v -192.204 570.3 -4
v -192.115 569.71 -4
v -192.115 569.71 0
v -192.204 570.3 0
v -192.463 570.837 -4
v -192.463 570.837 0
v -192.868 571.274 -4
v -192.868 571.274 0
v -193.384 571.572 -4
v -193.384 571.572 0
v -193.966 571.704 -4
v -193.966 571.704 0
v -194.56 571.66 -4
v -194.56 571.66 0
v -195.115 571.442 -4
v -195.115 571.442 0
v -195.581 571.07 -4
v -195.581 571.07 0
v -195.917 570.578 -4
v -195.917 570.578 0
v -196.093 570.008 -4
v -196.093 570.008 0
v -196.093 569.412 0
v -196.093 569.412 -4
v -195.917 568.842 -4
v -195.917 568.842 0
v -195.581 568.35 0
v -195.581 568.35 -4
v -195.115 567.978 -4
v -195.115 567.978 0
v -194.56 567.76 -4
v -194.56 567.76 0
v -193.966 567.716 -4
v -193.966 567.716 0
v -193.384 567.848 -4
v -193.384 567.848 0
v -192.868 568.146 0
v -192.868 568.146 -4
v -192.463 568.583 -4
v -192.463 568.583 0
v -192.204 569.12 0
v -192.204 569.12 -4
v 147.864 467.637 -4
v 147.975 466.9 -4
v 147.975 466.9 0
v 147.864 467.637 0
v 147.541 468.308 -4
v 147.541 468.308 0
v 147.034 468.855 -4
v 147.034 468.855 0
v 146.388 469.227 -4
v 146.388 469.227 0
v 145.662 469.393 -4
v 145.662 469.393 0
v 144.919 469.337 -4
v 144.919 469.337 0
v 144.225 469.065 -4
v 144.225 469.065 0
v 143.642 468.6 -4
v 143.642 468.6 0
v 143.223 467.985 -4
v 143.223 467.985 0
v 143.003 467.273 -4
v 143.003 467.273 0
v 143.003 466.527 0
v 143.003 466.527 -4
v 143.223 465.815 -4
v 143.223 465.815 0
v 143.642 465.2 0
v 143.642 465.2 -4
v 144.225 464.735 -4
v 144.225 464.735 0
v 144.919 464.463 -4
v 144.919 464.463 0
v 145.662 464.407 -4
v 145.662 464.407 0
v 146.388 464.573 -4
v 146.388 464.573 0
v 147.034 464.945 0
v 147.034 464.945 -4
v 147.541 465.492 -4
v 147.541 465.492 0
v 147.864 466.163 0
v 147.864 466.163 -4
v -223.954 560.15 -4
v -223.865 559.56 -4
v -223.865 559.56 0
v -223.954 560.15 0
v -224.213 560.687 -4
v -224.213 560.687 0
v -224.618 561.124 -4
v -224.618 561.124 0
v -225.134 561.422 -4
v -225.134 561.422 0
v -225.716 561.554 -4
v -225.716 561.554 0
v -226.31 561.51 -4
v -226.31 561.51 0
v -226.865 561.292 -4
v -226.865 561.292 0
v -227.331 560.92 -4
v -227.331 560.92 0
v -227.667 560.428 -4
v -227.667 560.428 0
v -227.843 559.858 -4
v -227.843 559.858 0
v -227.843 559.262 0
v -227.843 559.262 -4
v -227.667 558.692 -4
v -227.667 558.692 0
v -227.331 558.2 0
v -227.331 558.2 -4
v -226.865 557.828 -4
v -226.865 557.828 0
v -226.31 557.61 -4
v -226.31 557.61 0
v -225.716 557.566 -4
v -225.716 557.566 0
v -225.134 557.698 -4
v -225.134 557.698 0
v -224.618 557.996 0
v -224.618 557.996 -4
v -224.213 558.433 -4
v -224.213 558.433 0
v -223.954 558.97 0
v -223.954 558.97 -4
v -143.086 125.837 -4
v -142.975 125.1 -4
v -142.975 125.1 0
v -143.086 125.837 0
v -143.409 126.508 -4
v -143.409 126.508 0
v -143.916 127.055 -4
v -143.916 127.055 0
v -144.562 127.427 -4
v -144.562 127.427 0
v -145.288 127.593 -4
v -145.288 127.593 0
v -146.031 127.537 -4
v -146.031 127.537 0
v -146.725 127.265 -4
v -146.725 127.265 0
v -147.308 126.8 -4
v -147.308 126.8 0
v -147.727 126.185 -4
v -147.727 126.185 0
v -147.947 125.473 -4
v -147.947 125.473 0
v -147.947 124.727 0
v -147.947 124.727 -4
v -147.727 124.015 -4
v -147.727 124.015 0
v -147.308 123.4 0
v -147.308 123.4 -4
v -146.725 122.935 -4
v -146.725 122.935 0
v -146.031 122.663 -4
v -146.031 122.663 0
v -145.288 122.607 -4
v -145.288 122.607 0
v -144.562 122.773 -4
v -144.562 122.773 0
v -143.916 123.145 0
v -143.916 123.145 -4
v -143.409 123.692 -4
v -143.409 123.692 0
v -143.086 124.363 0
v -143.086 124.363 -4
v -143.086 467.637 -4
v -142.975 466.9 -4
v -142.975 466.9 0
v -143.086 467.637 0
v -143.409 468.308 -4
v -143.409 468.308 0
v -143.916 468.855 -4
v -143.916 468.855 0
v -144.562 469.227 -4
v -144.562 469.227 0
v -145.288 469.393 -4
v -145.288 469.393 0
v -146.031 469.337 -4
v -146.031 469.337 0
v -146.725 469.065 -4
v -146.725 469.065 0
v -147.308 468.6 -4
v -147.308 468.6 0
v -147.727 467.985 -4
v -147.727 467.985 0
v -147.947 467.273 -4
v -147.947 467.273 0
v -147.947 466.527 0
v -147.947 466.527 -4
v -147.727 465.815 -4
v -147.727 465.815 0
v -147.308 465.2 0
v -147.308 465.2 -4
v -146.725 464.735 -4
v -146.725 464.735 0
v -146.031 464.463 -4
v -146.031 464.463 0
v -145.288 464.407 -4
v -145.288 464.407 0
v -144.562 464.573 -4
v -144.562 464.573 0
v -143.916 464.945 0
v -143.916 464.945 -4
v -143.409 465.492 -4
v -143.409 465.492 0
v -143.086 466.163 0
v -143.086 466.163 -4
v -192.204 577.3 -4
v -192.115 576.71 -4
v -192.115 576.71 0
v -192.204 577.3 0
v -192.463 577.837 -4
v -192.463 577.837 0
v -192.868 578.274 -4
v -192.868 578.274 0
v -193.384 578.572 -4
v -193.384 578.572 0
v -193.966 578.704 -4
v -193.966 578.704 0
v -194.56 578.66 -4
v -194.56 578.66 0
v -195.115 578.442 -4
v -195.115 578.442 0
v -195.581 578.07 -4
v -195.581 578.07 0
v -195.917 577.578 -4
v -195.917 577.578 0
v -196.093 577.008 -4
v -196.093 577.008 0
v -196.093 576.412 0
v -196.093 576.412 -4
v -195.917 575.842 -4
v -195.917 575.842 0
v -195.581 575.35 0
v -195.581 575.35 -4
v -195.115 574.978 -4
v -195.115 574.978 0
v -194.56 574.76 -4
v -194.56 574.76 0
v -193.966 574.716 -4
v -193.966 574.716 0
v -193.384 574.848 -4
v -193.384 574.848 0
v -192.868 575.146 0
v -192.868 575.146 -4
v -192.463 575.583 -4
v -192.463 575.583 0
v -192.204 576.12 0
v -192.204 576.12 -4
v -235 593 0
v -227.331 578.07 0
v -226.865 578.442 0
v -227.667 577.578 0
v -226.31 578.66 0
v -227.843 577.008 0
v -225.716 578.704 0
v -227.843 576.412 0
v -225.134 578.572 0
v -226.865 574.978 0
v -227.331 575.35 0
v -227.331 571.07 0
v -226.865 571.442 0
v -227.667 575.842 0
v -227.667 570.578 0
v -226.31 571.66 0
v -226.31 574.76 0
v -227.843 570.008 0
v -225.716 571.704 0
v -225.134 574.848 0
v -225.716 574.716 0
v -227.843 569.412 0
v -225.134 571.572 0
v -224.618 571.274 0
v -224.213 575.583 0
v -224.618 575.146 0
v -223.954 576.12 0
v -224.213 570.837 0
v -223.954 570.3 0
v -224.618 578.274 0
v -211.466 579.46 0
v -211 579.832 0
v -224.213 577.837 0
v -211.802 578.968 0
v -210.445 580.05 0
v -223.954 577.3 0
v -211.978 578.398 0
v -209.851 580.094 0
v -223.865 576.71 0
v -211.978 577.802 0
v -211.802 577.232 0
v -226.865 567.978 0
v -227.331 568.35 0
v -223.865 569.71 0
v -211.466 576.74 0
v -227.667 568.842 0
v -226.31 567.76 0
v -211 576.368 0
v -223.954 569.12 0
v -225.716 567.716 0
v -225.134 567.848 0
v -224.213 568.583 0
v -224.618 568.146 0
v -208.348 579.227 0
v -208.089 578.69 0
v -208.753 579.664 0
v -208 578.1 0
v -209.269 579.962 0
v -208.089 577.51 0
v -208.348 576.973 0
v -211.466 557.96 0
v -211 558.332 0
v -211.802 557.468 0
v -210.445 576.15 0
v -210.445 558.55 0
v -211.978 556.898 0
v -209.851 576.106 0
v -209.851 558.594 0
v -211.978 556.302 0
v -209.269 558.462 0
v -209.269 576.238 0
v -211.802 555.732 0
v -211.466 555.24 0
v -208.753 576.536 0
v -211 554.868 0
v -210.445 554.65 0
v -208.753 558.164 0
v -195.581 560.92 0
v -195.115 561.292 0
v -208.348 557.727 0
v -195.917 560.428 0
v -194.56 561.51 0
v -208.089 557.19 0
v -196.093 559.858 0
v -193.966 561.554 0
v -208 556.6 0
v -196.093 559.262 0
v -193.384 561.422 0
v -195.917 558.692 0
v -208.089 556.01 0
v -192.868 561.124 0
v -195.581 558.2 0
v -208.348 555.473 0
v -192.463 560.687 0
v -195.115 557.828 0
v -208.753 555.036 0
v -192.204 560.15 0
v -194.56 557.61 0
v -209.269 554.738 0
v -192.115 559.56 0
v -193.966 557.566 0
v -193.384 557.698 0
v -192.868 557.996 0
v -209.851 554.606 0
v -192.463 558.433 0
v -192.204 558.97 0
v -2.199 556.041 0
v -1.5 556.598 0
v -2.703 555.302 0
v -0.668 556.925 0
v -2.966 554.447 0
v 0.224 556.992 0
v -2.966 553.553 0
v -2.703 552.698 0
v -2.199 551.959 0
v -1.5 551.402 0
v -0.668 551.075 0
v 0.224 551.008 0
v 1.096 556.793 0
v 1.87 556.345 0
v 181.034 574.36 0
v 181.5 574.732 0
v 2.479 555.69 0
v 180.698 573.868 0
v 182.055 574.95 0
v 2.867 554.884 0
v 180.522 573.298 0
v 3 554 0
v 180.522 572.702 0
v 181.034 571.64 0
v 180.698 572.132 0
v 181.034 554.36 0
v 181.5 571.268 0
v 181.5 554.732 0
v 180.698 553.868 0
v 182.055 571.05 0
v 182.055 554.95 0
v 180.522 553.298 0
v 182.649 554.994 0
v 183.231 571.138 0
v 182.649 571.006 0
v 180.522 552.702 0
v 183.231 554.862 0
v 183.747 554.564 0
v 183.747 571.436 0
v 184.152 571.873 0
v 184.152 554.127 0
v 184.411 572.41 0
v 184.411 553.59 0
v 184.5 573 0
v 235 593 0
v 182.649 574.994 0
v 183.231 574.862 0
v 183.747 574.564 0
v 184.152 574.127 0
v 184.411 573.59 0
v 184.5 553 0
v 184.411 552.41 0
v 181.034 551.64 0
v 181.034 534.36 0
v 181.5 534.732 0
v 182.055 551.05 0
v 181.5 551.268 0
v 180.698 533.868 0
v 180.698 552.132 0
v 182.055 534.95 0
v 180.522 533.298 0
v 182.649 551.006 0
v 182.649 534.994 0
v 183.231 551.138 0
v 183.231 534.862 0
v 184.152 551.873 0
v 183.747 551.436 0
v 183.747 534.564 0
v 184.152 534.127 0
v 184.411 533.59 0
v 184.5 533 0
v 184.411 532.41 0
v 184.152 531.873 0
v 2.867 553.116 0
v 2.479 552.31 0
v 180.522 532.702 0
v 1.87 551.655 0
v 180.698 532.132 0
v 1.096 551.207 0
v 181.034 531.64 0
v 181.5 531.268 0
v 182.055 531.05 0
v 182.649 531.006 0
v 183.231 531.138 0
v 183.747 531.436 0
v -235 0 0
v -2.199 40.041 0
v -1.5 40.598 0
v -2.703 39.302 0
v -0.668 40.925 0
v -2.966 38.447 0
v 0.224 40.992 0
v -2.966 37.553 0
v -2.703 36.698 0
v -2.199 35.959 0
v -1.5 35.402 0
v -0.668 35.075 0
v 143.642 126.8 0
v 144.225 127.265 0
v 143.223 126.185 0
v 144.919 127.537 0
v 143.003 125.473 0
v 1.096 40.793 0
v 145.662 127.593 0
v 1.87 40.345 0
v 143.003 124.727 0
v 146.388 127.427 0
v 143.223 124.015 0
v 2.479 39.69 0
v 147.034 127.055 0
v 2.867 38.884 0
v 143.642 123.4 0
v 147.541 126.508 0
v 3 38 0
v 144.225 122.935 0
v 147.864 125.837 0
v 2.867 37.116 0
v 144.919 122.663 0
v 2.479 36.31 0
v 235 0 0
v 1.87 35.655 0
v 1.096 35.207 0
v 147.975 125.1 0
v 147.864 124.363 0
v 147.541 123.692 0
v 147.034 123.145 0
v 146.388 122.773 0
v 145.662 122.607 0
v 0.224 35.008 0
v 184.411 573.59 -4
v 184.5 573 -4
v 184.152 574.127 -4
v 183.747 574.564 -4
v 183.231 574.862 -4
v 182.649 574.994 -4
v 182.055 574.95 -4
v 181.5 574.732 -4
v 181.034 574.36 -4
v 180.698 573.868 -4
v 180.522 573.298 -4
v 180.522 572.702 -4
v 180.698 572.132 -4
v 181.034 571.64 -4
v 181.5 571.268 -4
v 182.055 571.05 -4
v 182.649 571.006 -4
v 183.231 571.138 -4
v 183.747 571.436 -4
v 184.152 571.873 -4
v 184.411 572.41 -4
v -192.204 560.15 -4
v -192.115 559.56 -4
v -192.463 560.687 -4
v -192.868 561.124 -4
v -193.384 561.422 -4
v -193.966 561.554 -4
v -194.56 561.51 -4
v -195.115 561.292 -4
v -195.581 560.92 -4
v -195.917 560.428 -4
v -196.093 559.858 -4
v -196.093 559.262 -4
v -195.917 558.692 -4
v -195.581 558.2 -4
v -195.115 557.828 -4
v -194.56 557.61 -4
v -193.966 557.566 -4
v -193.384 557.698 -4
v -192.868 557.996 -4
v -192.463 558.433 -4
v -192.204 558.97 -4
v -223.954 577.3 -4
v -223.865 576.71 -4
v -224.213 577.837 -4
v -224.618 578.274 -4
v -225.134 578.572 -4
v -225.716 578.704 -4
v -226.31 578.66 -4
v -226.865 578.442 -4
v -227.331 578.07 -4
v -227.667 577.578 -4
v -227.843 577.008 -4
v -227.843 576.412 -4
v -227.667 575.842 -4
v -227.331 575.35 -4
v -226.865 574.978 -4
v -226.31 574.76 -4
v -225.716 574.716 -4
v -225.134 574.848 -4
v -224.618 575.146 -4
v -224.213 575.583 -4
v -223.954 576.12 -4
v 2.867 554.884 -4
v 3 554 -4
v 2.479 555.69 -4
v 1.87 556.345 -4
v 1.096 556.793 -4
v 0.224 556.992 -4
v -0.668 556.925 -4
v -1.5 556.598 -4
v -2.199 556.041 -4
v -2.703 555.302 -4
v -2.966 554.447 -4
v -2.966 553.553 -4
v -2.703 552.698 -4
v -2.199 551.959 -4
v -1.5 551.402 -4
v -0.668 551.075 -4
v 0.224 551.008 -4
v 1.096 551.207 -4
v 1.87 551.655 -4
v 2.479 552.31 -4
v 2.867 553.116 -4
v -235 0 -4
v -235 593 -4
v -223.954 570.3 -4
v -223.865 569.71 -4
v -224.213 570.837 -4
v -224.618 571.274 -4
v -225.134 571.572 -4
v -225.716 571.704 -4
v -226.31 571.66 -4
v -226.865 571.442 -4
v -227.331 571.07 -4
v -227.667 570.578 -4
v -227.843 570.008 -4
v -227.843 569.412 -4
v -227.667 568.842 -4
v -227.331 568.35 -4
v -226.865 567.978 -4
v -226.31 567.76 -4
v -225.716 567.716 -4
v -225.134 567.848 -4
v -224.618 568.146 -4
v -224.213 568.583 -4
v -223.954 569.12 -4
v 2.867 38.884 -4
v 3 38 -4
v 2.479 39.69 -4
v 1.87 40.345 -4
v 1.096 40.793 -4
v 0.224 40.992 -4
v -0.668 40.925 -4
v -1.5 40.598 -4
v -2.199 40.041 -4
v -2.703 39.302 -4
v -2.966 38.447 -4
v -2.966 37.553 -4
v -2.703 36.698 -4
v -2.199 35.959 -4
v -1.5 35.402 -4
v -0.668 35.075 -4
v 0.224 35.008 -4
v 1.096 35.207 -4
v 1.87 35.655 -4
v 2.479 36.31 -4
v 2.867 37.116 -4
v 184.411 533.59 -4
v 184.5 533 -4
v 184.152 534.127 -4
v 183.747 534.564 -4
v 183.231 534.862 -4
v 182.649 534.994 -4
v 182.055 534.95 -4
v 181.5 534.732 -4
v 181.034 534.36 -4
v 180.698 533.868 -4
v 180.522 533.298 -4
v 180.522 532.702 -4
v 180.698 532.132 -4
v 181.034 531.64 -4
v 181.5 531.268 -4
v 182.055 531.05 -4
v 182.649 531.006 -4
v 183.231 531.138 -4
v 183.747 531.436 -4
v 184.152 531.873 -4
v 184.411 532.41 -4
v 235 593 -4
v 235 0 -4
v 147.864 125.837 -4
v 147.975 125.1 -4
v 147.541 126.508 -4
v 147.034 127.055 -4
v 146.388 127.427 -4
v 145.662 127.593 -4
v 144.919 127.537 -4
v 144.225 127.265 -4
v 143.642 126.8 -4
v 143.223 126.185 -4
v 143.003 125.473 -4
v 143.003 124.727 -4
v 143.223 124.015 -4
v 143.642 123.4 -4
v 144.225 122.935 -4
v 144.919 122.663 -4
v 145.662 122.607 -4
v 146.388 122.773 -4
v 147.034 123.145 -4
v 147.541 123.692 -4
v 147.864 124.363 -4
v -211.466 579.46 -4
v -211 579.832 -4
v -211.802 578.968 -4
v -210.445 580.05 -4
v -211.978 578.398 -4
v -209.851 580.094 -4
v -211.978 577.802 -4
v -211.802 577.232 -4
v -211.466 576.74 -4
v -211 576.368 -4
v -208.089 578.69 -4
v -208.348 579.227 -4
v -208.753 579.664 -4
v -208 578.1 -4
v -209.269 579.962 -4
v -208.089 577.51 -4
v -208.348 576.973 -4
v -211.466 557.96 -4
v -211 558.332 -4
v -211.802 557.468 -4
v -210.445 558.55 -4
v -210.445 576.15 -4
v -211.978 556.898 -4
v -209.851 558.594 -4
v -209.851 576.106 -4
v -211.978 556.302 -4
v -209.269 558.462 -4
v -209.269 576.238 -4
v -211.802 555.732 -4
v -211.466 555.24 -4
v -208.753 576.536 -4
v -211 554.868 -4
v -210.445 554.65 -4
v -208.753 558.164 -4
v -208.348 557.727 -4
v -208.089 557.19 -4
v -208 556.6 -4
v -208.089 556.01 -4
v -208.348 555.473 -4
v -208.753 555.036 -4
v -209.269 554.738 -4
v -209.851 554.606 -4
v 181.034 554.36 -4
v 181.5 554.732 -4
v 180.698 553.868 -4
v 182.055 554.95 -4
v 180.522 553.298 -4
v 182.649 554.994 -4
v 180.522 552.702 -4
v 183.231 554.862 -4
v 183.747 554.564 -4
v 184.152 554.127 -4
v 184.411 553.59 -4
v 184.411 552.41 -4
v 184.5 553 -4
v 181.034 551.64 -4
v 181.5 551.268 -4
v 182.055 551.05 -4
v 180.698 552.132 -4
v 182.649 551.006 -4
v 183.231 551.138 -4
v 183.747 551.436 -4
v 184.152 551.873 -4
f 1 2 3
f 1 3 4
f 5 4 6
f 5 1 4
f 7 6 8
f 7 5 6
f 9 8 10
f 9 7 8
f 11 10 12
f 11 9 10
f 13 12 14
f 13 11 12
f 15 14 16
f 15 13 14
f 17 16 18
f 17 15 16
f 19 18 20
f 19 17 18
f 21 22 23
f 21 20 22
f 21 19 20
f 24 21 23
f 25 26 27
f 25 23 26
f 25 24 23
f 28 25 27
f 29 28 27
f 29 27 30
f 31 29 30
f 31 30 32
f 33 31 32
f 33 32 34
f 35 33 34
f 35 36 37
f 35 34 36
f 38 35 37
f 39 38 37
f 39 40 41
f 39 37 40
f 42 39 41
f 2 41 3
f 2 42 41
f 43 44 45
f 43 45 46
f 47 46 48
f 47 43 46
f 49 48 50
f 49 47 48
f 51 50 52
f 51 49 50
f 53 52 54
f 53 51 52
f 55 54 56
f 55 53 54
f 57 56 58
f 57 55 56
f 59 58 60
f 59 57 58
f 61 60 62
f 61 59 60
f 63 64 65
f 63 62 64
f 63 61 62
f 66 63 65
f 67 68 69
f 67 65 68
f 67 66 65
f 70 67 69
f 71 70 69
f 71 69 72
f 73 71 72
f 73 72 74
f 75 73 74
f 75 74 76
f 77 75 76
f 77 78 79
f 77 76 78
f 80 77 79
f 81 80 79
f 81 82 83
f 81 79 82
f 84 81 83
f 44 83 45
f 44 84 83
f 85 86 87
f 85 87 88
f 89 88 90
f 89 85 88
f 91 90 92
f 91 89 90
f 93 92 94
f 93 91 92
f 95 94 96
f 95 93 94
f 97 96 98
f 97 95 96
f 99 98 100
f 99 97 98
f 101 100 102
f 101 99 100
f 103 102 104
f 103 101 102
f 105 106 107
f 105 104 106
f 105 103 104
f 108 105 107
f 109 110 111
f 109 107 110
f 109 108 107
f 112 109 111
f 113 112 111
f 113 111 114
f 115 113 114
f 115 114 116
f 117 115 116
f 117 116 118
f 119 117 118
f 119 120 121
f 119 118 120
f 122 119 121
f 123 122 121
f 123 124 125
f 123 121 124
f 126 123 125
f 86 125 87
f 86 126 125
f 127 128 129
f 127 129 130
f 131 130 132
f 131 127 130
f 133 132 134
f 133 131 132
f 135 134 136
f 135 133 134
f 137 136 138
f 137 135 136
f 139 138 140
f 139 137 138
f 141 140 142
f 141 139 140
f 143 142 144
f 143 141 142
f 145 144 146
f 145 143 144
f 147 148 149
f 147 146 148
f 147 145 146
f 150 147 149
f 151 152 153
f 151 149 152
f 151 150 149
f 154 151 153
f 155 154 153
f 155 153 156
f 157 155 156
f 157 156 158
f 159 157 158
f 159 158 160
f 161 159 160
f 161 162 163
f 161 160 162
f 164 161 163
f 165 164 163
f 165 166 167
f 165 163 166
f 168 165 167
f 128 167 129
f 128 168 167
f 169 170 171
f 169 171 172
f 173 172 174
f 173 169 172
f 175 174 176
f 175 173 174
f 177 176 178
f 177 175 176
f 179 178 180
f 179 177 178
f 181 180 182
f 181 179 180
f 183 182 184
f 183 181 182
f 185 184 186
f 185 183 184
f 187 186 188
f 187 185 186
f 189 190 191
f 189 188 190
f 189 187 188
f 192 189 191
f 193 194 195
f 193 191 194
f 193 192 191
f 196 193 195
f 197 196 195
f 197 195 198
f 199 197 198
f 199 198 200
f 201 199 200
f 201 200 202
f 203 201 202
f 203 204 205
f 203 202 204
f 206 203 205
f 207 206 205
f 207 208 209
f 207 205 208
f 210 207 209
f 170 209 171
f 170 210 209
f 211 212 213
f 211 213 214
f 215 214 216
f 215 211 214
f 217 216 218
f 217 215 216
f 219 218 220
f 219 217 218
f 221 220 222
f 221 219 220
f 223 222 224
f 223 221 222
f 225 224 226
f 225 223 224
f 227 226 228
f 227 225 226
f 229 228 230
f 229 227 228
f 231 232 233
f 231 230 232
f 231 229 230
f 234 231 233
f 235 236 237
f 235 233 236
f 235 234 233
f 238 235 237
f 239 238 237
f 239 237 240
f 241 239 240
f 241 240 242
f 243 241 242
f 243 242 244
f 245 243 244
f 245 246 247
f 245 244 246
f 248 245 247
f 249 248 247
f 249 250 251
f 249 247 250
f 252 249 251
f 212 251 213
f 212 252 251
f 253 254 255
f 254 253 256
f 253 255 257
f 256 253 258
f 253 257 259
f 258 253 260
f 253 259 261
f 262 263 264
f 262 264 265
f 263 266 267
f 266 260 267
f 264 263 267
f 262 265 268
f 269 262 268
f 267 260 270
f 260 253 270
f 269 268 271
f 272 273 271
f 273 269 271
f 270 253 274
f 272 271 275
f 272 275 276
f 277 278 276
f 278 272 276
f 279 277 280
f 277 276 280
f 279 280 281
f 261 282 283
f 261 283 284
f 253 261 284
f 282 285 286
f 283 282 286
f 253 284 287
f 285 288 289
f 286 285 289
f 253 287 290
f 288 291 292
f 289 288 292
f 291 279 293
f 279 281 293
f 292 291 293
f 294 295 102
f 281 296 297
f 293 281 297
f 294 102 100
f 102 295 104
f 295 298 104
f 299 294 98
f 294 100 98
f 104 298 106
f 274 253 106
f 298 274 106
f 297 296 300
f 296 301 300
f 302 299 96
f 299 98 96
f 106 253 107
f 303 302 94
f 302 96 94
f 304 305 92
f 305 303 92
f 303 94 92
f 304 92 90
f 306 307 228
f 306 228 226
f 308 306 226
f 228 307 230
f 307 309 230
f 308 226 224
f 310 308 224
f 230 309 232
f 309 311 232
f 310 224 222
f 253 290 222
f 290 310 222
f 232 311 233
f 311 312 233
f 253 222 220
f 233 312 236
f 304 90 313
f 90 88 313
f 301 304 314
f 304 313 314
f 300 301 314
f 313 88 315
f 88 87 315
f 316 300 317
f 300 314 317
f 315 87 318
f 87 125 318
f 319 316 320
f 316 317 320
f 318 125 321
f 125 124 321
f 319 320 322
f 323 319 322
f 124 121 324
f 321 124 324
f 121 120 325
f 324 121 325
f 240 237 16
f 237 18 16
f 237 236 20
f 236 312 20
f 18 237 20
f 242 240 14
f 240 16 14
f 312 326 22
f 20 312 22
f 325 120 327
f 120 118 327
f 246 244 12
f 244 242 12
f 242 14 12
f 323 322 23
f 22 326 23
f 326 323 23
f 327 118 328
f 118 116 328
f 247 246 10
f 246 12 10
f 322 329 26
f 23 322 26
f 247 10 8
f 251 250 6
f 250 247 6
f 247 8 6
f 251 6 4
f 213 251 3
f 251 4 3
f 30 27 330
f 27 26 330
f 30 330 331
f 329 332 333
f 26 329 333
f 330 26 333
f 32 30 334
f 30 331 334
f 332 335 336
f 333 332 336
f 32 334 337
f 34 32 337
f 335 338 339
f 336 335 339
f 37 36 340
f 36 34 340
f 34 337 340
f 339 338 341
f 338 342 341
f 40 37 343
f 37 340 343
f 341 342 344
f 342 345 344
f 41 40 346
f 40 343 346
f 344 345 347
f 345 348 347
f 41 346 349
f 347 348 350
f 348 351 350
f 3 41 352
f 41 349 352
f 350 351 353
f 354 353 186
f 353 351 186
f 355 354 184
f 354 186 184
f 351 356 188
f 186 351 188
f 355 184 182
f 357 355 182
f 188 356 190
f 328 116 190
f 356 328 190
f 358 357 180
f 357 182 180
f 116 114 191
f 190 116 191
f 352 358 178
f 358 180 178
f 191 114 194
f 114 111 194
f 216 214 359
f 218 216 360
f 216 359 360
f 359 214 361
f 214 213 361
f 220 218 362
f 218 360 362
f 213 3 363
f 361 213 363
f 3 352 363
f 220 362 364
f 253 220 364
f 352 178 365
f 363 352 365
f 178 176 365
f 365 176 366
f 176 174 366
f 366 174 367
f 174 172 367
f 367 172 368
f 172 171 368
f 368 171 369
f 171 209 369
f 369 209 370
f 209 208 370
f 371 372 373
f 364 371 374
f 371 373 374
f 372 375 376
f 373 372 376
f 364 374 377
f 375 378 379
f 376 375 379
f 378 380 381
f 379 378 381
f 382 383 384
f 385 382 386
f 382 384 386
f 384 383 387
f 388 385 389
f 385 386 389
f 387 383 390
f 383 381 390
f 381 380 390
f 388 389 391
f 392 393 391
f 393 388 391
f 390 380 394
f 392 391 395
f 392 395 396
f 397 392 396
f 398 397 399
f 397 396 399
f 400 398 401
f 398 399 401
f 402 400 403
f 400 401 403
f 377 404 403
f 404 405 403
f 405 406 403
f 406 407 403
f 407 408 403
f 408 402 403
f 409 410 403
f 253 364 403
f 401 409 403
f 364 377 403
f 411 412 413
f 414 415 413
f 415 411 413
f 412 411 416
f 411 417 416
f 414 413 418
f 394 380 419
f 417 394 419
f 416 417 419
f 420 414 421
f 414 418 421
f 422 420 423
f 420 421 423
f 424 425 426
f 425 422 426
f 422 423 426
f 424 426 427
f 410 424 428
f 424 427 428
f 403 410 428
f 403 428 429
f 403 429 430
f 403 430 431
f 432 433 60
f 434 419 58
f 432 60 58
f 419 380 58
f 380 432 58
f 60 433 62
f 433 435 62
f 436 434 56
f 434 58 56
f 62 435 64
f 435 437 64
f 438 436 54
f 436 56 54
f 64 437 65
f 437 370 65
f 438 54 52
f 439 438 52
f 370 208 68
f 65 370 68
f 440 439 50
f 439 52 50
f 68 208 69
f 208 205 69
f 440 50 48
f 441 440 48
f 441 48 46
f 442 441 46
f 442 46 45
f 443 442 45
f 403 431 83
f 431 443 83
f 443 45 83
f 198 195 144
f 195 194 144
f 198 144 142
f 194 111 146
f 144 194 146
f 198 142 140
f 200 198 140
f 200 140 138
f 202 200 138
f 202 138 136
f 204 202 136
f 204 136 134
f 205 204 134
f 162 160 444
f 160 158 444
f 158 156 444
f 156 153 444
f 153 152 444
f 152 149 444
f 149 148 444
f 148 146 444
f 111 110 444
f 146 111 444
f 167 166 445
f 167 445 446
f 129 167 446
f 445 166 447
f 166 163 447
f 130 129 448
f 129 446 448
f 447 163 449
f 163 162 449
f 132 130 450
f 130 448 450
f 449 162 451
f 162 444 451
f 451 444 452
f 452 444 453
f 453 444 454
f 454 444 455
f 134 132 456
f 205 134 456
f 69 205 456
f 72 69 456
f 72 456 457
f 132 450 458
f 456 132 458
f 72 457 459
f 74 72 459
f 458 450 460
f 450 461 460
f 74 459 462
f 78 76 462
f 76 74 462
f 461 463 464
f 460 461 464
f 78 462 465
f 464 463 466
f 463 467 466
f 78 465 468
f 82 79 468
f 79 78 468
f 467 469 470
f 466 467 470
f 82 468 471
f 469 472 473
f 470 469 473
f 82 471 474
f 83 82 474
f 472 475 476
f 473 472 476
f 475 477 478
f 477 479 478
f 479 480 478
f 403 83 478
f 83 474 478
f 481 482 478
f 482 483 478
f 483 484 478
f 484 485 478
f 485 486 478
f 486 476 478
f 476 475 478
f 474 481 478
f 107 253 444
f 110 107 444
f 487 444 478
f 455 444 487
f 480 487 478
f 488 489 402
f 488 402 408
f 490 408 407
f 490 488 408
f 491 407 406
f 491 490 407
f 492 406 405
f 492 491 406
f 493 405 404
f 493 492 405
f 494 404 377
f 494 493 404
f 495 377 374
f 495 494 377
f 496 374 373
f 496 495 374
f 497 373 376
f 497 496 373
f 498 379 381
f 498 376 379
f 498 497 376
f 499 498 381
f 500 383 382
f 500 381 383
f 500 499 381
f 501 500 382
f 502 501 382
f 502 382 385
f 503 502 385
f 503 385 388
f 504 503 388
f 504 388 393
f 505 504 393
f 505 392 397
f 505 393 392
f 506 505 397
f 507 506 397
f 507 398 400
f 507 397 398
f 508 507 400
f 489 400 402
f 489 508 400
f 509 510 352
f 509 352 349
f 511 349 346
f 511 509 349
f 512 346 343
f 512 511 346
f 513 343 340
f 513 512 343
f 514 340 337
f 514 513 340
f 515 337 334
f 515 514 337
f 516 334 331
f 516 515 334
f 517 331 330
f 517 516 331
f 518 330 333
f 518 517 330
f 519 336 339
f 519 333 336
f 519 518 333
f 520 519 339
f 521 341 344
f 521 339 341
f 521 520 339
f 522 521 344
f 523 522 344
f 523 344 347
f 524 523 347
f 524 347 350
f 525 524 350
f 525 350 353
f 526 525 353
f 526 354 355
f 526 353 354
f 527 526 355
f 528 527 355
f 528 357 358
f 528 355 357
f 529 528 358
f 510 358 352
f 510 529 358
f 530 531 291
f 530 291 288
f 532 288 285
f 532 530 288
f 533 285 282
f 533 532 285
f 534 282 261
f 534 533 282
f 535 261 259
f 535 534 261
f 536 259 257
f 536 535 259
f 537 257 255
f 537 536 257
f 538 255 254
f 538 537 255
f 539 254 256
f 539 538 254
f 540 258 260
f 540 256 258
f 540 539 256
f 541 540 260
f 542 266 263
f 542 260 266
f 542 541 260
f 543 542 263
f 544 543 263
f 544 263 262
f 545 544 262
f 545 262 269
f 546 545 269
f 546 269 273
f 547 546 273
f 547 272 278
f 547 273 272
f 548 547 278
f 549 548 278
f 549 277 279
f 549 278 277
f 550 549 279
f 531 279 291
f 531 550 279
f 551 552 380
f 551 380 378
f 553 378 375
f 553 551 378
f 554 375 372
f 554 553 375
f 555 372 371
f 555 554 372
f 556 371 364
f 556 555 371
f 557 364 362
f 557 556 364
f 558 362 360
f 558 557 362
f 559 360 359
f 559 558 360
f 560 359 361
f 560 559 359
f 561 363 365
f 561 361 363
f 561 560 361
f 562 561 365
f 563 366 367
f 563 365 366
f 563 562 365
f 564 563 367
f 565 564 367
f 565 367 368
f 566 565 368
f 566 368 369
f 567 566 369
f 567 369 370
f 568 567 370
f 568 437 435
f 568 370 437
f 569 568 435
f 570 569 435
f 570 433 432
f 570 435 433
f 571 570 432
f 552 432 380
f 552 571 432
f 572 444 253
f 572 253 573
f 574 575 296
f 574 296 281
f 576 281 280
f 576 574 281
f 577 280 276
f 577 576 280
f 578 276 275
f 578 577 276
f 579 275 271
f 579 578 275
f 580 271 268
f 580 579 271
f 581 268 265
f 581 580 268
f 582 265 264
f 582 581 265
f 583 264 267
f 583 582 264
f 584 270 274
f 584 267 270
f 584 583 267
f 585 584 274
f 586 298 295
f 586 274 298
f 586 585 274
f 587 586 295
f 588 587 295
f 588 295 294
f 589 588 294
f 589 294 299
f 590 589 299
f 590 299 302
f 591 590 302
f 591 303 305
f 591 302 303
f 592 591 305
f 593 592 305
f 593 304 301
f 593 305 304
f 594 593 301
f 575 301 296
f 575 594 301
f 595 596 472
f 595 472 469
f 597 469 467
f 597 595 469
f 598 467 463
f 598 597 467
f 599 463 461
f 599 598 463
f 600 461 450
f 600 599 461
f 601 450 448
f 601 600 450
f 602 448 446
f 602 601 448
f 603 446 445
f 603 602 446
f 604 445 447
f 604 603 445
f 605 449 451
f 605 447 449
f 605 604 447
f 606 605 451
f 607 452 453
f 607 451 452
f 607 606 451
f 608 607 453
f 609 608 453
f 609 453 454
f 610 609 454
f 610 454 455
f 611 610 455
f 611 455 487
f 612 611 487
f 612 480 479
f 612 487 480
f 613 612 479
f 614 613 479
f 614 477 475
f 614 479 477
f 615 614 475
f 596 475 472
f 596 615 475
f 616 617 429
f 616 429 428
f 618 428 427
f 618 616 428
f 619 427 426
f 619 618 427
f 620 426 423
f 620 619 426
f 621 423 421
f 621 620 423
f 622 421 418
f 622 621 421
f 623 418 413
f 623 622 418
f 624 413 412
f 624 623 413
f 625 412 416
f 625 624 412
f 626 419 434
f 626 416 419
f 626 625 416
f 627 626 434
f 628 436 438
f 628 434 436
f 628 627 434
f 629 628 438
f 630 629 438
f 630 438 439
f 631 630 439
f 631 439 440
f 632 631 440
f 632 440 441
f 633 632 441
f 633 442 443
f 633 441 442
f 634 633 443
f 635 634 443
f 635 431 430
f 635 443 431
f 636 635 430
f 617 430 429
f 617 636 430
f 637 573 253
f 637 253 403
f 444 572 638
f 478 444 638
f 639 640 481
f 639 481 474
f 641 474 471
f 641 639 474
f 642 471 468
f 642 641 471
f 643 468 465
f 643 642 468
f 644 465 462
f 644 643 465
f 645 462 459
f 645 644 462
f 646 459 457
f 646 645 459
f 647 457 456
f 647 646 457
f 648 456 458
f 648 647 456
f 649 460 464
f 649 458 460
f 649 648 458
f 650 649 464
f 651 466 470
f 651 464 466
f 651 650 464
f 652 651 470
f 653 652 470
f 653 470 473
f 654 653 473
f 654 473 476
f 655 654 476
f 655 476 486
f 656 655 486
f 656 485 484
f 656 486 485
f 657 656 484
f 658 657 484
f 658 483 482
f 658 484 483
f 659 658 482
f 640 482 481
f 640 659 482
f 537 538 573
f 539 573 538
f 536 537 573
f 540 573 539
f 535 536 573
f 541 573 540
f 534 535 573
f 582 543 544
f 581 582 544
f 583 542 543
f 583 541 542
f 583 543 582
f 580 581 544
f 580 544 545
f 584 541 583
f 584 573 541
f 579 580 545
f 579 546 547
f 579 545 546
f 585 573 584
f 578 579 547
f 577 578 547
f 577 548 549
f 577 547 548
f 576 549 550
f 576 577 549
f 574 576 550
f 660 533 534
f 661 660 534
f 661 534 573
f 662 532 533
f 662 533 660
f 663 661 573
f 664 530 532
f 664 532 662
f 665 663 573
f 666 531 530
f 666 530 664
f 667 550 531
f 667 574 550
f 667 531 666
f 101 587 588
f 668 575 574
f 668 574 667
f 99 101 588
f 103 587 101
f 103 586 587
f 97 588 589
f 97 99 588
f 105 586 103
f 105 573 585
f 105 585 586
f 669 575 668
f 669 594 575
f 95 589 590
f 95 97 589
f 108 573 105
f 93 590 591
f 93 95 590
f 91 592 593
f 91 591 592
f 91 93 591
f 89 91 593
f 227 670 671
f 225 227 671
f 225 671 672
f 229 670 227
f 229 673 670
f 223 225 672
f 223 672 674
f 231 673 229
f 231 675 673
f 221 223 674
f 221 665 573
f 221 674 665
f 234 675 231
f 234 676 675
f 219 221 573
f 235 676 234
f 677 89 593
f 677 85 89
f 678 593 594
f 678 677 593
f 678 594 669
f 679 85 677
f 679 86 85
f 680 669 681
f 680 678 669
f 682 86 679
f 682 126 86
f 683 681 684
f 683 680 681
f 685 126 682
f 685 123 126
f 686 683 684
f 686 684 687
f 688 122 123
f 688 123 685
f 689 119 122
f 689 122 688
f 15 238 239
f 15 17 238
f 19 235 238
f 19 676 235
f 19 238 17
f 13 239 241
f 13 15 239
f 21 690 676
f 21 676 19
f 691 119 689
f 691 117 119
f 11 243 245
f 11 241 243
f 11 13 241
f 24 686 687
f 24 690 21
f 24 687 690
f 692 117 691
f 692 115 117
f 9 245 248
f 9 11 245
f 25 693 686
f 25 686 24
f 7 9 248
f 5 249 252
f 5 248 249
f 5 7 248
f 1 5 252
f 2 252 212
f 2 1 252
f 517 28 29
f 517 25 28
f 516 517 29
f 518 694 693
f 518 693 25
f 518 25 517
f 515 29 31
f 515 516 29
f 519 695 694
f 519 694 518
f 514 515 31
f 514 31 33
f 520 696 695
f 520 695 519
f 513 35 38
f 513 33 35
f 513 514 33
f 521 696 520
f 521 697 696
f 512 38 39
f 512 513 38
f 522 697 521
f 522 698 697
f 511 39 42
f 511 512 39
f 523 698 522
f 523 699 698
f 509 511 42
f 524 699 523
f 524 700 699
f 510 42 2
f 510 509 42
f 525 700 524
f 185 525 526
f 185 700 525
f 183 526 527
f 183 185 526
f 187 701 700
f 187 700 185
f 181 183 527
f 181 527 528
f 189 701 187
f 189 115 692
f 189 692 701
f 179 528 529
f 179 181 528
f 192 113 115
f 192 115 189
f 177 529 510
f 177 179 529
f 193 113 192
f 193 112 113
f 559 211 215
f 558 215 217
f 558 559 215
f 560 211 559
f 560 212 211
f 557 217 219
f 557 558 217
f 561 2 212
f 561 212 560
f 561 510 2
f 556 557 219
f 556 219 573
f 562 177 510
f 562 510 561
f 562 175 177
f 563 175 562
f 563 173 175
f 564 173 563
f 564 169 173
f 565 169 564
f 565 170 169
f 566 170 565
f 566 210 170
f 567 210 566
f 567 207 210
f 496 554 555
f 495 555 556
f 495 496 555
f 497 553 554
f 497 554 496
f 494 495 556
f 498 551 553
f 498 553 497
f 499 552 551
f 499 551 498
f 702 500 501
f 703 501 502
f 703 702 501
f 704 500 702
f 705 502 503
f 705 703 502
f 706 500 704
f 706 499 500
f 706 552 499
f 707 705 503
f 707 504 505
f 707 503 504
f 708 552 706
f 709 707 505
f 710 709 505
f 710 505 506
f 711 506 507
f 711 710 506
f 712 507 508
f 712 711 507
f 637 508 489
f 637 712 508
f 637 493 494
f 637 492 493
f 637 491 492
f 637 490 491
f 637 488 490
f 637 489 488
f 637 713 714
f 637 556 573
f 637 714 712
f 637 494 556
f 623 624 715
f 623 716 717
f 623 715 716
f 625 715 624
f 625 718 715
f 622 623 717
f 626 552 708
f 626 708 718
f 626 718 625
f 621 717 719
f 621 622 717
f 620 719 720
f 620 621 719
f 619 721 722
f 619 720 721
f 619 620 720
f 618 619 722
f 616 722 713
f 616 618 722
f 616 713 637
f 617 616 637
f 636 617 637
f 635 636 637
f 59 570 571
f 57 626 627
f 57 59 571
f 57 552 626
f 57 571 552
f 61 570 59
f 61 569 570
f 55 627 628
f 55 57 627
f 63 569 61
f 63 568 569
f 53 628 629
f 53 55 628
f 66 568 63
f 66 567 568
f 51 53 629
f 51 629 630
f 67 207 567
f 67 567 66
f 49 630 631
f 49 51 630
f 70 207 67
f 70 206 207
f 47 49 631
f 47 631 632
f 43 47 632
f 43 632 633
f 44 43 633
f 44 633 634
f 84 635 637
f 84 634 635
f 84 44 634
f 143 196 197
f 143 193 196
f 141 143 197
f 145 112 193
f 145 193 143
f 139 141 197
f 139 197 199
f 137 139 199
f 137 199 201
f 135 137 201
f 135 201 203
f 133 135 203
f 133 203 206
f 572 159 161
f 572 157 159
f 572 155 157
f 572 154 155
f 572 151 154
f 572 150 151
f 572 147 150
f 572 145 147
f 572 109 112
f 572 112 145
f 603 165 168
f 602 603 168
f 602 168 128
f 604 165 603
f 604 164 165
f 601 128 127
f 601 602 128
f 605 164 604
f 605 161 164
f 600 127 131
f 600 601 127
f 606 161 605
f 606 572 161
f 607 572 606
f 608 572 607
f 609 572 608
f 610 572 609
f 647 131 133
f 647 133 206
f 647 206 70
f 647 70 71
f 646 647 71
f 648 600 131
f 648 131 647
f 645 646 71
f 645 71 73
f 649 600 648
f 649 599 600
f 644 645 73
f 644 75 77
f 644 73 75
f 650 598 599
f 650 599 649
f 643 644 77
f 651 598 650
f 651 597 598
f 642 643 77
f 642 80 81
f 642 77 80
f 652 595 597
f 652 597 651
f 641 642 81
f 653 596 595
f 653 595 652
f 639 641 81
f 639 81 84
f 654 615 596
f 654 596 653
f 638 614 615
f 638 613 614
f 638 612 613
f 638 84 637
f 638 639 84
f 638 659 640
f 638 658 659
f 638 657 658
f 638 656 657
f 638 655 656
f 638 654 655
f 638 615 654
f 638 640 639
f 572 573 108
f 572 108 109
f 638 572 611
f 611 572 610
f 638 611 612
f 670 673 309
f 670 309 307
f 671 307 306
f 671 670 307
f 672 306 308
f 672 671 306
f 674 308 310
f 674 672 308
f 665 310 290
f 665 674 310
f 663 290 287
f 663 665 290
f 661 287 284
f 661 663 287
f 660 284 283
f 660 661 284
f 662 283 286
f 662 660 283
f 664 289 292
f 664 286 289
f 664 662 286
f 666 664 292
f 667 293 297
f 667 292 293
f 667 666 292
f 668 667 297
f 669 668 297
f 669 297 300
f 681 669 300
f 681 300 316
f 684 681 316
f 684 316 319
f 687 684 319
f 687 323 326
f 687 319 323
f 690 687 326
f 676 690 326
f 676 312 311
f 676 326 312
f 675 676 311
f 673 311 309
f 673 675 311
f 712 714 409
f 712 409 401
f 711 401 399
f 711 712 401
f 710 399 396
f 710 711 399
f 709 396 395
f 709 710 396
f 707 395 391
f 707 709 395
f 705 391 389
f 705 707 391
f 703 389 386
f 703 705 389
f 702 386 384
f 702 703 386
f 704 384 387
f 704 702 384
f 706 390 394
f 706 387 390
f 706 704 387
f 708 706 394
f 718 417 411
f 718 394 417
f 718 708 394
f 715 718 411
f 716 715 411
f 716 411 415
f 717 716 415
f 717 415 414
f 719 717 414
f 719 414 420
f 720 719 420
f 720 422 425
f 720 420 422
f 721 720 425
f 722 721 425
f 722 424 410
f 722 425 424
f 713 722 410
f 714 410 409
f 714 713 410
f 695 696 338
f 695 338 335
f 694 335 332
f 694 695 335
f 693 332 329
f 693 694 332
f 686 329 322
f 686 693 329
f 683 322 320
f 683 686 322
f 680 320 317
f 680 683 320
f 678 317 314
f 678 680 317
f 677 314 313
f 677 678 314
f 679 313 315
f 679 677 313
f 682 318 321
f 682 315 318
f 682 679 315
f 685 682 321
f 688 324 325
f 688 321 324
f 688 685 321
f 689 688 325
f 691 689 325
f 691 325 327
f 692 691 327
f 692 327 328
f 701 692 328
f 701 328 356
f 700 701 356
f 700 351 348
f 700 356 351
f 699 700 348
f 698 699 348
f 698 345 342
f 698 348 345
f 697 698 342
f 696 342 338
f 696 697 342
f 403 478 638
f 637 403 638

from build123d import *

# Parameters (mm, degrees)
SKETCH_R            = 2
SKETCH_R_2          = 3
SKETCH_R_3          = 2.5
EXTRUDE_DEPTH       = 20
BOX_W               = 470
BOX_H               = 4
BOX_DEPTH           = 593
CUT_PLACEMENT_ANGLE = 270


with BuildPart() as extrude_body:
    # Sketch → Extrude (new body)
    with BuildSketch(Plane.XZ):
        with Locations((-225.865, 576.71)):
            Circle(SKETCH_R)
        with Locations((-225.865, 569.71)):
            Circle(SKETCH_R)
        with Locations((-225.865, 559.56)):
            Circle(SKETCH_R)
        with Locations((-210, 556.6)):
            Circle(SKETCH_R)
        with Locations((-210, 578.1)):
            Circle(SKETCH_R)
        with Locations((-194.115, 576.71)):
            Circle(SKETCH_R)
        with Locations((-194.115, 569.71)):
            Circle(SKETCH_R)
        with Locations((-194.115, 559.56)):
            Circle(SKETCH_R)
        with Locations((0, 38)):
            Circle(SKETCH_R_2)
        with Locations((0, 554)):
            Circle(SKETCH_R_2)
        with Locations((182.5, 573)):
            Circle(SKETCH_R)
        with Locations((182.5, 553)):
            Circle(SKETCH_R)
        with Locations((182.5, 533)):
            Circle(SKETCH_R)
        with Locations((145.475, 466.9)):
            Circle(SKETCH_R_3)
        with Locations((-145.475, 466.9)):
            Circle(SKETCH_R_3)
        with Locations((-145.475, 125.1)):
            Circle(SKETCH_R_3)
        with Locations((145.475, 125.1)):
            Circle(SKETCH_R_3)
    extrude(amount=EXTRUDE_DEPTH)


with BuildPart() as extrude_body_1:
    # Extrude placement: moved
    add(extrude_body.part.moved(Location((0, 13, 0))))


with BuildPart() as base_holecut:
    # Box → Box (new body)
    with BuildSketch(Plane(origin=(-235, 0, 0), x_dir=(1, 0, 0), z_dir=(0, 0, 1))):
        with Locations((235, 2)):
            Rectangle(BOX_W, BOX_H)
    extrude(amount=BOX_DEPTH)

    # Cut: cut Extrude body
    add(extrude_body_1.part, mode=Mode.SUBTRACT)


with BuildPart() as base_holecut_1:
    # Cut placement: moved
    add(base_holecut.part.rotate(Axis((0, 0, 0), (1, 0, 0)), CUT_PLACEMENT_ANGLE))


solid = base_holecut_1.part
